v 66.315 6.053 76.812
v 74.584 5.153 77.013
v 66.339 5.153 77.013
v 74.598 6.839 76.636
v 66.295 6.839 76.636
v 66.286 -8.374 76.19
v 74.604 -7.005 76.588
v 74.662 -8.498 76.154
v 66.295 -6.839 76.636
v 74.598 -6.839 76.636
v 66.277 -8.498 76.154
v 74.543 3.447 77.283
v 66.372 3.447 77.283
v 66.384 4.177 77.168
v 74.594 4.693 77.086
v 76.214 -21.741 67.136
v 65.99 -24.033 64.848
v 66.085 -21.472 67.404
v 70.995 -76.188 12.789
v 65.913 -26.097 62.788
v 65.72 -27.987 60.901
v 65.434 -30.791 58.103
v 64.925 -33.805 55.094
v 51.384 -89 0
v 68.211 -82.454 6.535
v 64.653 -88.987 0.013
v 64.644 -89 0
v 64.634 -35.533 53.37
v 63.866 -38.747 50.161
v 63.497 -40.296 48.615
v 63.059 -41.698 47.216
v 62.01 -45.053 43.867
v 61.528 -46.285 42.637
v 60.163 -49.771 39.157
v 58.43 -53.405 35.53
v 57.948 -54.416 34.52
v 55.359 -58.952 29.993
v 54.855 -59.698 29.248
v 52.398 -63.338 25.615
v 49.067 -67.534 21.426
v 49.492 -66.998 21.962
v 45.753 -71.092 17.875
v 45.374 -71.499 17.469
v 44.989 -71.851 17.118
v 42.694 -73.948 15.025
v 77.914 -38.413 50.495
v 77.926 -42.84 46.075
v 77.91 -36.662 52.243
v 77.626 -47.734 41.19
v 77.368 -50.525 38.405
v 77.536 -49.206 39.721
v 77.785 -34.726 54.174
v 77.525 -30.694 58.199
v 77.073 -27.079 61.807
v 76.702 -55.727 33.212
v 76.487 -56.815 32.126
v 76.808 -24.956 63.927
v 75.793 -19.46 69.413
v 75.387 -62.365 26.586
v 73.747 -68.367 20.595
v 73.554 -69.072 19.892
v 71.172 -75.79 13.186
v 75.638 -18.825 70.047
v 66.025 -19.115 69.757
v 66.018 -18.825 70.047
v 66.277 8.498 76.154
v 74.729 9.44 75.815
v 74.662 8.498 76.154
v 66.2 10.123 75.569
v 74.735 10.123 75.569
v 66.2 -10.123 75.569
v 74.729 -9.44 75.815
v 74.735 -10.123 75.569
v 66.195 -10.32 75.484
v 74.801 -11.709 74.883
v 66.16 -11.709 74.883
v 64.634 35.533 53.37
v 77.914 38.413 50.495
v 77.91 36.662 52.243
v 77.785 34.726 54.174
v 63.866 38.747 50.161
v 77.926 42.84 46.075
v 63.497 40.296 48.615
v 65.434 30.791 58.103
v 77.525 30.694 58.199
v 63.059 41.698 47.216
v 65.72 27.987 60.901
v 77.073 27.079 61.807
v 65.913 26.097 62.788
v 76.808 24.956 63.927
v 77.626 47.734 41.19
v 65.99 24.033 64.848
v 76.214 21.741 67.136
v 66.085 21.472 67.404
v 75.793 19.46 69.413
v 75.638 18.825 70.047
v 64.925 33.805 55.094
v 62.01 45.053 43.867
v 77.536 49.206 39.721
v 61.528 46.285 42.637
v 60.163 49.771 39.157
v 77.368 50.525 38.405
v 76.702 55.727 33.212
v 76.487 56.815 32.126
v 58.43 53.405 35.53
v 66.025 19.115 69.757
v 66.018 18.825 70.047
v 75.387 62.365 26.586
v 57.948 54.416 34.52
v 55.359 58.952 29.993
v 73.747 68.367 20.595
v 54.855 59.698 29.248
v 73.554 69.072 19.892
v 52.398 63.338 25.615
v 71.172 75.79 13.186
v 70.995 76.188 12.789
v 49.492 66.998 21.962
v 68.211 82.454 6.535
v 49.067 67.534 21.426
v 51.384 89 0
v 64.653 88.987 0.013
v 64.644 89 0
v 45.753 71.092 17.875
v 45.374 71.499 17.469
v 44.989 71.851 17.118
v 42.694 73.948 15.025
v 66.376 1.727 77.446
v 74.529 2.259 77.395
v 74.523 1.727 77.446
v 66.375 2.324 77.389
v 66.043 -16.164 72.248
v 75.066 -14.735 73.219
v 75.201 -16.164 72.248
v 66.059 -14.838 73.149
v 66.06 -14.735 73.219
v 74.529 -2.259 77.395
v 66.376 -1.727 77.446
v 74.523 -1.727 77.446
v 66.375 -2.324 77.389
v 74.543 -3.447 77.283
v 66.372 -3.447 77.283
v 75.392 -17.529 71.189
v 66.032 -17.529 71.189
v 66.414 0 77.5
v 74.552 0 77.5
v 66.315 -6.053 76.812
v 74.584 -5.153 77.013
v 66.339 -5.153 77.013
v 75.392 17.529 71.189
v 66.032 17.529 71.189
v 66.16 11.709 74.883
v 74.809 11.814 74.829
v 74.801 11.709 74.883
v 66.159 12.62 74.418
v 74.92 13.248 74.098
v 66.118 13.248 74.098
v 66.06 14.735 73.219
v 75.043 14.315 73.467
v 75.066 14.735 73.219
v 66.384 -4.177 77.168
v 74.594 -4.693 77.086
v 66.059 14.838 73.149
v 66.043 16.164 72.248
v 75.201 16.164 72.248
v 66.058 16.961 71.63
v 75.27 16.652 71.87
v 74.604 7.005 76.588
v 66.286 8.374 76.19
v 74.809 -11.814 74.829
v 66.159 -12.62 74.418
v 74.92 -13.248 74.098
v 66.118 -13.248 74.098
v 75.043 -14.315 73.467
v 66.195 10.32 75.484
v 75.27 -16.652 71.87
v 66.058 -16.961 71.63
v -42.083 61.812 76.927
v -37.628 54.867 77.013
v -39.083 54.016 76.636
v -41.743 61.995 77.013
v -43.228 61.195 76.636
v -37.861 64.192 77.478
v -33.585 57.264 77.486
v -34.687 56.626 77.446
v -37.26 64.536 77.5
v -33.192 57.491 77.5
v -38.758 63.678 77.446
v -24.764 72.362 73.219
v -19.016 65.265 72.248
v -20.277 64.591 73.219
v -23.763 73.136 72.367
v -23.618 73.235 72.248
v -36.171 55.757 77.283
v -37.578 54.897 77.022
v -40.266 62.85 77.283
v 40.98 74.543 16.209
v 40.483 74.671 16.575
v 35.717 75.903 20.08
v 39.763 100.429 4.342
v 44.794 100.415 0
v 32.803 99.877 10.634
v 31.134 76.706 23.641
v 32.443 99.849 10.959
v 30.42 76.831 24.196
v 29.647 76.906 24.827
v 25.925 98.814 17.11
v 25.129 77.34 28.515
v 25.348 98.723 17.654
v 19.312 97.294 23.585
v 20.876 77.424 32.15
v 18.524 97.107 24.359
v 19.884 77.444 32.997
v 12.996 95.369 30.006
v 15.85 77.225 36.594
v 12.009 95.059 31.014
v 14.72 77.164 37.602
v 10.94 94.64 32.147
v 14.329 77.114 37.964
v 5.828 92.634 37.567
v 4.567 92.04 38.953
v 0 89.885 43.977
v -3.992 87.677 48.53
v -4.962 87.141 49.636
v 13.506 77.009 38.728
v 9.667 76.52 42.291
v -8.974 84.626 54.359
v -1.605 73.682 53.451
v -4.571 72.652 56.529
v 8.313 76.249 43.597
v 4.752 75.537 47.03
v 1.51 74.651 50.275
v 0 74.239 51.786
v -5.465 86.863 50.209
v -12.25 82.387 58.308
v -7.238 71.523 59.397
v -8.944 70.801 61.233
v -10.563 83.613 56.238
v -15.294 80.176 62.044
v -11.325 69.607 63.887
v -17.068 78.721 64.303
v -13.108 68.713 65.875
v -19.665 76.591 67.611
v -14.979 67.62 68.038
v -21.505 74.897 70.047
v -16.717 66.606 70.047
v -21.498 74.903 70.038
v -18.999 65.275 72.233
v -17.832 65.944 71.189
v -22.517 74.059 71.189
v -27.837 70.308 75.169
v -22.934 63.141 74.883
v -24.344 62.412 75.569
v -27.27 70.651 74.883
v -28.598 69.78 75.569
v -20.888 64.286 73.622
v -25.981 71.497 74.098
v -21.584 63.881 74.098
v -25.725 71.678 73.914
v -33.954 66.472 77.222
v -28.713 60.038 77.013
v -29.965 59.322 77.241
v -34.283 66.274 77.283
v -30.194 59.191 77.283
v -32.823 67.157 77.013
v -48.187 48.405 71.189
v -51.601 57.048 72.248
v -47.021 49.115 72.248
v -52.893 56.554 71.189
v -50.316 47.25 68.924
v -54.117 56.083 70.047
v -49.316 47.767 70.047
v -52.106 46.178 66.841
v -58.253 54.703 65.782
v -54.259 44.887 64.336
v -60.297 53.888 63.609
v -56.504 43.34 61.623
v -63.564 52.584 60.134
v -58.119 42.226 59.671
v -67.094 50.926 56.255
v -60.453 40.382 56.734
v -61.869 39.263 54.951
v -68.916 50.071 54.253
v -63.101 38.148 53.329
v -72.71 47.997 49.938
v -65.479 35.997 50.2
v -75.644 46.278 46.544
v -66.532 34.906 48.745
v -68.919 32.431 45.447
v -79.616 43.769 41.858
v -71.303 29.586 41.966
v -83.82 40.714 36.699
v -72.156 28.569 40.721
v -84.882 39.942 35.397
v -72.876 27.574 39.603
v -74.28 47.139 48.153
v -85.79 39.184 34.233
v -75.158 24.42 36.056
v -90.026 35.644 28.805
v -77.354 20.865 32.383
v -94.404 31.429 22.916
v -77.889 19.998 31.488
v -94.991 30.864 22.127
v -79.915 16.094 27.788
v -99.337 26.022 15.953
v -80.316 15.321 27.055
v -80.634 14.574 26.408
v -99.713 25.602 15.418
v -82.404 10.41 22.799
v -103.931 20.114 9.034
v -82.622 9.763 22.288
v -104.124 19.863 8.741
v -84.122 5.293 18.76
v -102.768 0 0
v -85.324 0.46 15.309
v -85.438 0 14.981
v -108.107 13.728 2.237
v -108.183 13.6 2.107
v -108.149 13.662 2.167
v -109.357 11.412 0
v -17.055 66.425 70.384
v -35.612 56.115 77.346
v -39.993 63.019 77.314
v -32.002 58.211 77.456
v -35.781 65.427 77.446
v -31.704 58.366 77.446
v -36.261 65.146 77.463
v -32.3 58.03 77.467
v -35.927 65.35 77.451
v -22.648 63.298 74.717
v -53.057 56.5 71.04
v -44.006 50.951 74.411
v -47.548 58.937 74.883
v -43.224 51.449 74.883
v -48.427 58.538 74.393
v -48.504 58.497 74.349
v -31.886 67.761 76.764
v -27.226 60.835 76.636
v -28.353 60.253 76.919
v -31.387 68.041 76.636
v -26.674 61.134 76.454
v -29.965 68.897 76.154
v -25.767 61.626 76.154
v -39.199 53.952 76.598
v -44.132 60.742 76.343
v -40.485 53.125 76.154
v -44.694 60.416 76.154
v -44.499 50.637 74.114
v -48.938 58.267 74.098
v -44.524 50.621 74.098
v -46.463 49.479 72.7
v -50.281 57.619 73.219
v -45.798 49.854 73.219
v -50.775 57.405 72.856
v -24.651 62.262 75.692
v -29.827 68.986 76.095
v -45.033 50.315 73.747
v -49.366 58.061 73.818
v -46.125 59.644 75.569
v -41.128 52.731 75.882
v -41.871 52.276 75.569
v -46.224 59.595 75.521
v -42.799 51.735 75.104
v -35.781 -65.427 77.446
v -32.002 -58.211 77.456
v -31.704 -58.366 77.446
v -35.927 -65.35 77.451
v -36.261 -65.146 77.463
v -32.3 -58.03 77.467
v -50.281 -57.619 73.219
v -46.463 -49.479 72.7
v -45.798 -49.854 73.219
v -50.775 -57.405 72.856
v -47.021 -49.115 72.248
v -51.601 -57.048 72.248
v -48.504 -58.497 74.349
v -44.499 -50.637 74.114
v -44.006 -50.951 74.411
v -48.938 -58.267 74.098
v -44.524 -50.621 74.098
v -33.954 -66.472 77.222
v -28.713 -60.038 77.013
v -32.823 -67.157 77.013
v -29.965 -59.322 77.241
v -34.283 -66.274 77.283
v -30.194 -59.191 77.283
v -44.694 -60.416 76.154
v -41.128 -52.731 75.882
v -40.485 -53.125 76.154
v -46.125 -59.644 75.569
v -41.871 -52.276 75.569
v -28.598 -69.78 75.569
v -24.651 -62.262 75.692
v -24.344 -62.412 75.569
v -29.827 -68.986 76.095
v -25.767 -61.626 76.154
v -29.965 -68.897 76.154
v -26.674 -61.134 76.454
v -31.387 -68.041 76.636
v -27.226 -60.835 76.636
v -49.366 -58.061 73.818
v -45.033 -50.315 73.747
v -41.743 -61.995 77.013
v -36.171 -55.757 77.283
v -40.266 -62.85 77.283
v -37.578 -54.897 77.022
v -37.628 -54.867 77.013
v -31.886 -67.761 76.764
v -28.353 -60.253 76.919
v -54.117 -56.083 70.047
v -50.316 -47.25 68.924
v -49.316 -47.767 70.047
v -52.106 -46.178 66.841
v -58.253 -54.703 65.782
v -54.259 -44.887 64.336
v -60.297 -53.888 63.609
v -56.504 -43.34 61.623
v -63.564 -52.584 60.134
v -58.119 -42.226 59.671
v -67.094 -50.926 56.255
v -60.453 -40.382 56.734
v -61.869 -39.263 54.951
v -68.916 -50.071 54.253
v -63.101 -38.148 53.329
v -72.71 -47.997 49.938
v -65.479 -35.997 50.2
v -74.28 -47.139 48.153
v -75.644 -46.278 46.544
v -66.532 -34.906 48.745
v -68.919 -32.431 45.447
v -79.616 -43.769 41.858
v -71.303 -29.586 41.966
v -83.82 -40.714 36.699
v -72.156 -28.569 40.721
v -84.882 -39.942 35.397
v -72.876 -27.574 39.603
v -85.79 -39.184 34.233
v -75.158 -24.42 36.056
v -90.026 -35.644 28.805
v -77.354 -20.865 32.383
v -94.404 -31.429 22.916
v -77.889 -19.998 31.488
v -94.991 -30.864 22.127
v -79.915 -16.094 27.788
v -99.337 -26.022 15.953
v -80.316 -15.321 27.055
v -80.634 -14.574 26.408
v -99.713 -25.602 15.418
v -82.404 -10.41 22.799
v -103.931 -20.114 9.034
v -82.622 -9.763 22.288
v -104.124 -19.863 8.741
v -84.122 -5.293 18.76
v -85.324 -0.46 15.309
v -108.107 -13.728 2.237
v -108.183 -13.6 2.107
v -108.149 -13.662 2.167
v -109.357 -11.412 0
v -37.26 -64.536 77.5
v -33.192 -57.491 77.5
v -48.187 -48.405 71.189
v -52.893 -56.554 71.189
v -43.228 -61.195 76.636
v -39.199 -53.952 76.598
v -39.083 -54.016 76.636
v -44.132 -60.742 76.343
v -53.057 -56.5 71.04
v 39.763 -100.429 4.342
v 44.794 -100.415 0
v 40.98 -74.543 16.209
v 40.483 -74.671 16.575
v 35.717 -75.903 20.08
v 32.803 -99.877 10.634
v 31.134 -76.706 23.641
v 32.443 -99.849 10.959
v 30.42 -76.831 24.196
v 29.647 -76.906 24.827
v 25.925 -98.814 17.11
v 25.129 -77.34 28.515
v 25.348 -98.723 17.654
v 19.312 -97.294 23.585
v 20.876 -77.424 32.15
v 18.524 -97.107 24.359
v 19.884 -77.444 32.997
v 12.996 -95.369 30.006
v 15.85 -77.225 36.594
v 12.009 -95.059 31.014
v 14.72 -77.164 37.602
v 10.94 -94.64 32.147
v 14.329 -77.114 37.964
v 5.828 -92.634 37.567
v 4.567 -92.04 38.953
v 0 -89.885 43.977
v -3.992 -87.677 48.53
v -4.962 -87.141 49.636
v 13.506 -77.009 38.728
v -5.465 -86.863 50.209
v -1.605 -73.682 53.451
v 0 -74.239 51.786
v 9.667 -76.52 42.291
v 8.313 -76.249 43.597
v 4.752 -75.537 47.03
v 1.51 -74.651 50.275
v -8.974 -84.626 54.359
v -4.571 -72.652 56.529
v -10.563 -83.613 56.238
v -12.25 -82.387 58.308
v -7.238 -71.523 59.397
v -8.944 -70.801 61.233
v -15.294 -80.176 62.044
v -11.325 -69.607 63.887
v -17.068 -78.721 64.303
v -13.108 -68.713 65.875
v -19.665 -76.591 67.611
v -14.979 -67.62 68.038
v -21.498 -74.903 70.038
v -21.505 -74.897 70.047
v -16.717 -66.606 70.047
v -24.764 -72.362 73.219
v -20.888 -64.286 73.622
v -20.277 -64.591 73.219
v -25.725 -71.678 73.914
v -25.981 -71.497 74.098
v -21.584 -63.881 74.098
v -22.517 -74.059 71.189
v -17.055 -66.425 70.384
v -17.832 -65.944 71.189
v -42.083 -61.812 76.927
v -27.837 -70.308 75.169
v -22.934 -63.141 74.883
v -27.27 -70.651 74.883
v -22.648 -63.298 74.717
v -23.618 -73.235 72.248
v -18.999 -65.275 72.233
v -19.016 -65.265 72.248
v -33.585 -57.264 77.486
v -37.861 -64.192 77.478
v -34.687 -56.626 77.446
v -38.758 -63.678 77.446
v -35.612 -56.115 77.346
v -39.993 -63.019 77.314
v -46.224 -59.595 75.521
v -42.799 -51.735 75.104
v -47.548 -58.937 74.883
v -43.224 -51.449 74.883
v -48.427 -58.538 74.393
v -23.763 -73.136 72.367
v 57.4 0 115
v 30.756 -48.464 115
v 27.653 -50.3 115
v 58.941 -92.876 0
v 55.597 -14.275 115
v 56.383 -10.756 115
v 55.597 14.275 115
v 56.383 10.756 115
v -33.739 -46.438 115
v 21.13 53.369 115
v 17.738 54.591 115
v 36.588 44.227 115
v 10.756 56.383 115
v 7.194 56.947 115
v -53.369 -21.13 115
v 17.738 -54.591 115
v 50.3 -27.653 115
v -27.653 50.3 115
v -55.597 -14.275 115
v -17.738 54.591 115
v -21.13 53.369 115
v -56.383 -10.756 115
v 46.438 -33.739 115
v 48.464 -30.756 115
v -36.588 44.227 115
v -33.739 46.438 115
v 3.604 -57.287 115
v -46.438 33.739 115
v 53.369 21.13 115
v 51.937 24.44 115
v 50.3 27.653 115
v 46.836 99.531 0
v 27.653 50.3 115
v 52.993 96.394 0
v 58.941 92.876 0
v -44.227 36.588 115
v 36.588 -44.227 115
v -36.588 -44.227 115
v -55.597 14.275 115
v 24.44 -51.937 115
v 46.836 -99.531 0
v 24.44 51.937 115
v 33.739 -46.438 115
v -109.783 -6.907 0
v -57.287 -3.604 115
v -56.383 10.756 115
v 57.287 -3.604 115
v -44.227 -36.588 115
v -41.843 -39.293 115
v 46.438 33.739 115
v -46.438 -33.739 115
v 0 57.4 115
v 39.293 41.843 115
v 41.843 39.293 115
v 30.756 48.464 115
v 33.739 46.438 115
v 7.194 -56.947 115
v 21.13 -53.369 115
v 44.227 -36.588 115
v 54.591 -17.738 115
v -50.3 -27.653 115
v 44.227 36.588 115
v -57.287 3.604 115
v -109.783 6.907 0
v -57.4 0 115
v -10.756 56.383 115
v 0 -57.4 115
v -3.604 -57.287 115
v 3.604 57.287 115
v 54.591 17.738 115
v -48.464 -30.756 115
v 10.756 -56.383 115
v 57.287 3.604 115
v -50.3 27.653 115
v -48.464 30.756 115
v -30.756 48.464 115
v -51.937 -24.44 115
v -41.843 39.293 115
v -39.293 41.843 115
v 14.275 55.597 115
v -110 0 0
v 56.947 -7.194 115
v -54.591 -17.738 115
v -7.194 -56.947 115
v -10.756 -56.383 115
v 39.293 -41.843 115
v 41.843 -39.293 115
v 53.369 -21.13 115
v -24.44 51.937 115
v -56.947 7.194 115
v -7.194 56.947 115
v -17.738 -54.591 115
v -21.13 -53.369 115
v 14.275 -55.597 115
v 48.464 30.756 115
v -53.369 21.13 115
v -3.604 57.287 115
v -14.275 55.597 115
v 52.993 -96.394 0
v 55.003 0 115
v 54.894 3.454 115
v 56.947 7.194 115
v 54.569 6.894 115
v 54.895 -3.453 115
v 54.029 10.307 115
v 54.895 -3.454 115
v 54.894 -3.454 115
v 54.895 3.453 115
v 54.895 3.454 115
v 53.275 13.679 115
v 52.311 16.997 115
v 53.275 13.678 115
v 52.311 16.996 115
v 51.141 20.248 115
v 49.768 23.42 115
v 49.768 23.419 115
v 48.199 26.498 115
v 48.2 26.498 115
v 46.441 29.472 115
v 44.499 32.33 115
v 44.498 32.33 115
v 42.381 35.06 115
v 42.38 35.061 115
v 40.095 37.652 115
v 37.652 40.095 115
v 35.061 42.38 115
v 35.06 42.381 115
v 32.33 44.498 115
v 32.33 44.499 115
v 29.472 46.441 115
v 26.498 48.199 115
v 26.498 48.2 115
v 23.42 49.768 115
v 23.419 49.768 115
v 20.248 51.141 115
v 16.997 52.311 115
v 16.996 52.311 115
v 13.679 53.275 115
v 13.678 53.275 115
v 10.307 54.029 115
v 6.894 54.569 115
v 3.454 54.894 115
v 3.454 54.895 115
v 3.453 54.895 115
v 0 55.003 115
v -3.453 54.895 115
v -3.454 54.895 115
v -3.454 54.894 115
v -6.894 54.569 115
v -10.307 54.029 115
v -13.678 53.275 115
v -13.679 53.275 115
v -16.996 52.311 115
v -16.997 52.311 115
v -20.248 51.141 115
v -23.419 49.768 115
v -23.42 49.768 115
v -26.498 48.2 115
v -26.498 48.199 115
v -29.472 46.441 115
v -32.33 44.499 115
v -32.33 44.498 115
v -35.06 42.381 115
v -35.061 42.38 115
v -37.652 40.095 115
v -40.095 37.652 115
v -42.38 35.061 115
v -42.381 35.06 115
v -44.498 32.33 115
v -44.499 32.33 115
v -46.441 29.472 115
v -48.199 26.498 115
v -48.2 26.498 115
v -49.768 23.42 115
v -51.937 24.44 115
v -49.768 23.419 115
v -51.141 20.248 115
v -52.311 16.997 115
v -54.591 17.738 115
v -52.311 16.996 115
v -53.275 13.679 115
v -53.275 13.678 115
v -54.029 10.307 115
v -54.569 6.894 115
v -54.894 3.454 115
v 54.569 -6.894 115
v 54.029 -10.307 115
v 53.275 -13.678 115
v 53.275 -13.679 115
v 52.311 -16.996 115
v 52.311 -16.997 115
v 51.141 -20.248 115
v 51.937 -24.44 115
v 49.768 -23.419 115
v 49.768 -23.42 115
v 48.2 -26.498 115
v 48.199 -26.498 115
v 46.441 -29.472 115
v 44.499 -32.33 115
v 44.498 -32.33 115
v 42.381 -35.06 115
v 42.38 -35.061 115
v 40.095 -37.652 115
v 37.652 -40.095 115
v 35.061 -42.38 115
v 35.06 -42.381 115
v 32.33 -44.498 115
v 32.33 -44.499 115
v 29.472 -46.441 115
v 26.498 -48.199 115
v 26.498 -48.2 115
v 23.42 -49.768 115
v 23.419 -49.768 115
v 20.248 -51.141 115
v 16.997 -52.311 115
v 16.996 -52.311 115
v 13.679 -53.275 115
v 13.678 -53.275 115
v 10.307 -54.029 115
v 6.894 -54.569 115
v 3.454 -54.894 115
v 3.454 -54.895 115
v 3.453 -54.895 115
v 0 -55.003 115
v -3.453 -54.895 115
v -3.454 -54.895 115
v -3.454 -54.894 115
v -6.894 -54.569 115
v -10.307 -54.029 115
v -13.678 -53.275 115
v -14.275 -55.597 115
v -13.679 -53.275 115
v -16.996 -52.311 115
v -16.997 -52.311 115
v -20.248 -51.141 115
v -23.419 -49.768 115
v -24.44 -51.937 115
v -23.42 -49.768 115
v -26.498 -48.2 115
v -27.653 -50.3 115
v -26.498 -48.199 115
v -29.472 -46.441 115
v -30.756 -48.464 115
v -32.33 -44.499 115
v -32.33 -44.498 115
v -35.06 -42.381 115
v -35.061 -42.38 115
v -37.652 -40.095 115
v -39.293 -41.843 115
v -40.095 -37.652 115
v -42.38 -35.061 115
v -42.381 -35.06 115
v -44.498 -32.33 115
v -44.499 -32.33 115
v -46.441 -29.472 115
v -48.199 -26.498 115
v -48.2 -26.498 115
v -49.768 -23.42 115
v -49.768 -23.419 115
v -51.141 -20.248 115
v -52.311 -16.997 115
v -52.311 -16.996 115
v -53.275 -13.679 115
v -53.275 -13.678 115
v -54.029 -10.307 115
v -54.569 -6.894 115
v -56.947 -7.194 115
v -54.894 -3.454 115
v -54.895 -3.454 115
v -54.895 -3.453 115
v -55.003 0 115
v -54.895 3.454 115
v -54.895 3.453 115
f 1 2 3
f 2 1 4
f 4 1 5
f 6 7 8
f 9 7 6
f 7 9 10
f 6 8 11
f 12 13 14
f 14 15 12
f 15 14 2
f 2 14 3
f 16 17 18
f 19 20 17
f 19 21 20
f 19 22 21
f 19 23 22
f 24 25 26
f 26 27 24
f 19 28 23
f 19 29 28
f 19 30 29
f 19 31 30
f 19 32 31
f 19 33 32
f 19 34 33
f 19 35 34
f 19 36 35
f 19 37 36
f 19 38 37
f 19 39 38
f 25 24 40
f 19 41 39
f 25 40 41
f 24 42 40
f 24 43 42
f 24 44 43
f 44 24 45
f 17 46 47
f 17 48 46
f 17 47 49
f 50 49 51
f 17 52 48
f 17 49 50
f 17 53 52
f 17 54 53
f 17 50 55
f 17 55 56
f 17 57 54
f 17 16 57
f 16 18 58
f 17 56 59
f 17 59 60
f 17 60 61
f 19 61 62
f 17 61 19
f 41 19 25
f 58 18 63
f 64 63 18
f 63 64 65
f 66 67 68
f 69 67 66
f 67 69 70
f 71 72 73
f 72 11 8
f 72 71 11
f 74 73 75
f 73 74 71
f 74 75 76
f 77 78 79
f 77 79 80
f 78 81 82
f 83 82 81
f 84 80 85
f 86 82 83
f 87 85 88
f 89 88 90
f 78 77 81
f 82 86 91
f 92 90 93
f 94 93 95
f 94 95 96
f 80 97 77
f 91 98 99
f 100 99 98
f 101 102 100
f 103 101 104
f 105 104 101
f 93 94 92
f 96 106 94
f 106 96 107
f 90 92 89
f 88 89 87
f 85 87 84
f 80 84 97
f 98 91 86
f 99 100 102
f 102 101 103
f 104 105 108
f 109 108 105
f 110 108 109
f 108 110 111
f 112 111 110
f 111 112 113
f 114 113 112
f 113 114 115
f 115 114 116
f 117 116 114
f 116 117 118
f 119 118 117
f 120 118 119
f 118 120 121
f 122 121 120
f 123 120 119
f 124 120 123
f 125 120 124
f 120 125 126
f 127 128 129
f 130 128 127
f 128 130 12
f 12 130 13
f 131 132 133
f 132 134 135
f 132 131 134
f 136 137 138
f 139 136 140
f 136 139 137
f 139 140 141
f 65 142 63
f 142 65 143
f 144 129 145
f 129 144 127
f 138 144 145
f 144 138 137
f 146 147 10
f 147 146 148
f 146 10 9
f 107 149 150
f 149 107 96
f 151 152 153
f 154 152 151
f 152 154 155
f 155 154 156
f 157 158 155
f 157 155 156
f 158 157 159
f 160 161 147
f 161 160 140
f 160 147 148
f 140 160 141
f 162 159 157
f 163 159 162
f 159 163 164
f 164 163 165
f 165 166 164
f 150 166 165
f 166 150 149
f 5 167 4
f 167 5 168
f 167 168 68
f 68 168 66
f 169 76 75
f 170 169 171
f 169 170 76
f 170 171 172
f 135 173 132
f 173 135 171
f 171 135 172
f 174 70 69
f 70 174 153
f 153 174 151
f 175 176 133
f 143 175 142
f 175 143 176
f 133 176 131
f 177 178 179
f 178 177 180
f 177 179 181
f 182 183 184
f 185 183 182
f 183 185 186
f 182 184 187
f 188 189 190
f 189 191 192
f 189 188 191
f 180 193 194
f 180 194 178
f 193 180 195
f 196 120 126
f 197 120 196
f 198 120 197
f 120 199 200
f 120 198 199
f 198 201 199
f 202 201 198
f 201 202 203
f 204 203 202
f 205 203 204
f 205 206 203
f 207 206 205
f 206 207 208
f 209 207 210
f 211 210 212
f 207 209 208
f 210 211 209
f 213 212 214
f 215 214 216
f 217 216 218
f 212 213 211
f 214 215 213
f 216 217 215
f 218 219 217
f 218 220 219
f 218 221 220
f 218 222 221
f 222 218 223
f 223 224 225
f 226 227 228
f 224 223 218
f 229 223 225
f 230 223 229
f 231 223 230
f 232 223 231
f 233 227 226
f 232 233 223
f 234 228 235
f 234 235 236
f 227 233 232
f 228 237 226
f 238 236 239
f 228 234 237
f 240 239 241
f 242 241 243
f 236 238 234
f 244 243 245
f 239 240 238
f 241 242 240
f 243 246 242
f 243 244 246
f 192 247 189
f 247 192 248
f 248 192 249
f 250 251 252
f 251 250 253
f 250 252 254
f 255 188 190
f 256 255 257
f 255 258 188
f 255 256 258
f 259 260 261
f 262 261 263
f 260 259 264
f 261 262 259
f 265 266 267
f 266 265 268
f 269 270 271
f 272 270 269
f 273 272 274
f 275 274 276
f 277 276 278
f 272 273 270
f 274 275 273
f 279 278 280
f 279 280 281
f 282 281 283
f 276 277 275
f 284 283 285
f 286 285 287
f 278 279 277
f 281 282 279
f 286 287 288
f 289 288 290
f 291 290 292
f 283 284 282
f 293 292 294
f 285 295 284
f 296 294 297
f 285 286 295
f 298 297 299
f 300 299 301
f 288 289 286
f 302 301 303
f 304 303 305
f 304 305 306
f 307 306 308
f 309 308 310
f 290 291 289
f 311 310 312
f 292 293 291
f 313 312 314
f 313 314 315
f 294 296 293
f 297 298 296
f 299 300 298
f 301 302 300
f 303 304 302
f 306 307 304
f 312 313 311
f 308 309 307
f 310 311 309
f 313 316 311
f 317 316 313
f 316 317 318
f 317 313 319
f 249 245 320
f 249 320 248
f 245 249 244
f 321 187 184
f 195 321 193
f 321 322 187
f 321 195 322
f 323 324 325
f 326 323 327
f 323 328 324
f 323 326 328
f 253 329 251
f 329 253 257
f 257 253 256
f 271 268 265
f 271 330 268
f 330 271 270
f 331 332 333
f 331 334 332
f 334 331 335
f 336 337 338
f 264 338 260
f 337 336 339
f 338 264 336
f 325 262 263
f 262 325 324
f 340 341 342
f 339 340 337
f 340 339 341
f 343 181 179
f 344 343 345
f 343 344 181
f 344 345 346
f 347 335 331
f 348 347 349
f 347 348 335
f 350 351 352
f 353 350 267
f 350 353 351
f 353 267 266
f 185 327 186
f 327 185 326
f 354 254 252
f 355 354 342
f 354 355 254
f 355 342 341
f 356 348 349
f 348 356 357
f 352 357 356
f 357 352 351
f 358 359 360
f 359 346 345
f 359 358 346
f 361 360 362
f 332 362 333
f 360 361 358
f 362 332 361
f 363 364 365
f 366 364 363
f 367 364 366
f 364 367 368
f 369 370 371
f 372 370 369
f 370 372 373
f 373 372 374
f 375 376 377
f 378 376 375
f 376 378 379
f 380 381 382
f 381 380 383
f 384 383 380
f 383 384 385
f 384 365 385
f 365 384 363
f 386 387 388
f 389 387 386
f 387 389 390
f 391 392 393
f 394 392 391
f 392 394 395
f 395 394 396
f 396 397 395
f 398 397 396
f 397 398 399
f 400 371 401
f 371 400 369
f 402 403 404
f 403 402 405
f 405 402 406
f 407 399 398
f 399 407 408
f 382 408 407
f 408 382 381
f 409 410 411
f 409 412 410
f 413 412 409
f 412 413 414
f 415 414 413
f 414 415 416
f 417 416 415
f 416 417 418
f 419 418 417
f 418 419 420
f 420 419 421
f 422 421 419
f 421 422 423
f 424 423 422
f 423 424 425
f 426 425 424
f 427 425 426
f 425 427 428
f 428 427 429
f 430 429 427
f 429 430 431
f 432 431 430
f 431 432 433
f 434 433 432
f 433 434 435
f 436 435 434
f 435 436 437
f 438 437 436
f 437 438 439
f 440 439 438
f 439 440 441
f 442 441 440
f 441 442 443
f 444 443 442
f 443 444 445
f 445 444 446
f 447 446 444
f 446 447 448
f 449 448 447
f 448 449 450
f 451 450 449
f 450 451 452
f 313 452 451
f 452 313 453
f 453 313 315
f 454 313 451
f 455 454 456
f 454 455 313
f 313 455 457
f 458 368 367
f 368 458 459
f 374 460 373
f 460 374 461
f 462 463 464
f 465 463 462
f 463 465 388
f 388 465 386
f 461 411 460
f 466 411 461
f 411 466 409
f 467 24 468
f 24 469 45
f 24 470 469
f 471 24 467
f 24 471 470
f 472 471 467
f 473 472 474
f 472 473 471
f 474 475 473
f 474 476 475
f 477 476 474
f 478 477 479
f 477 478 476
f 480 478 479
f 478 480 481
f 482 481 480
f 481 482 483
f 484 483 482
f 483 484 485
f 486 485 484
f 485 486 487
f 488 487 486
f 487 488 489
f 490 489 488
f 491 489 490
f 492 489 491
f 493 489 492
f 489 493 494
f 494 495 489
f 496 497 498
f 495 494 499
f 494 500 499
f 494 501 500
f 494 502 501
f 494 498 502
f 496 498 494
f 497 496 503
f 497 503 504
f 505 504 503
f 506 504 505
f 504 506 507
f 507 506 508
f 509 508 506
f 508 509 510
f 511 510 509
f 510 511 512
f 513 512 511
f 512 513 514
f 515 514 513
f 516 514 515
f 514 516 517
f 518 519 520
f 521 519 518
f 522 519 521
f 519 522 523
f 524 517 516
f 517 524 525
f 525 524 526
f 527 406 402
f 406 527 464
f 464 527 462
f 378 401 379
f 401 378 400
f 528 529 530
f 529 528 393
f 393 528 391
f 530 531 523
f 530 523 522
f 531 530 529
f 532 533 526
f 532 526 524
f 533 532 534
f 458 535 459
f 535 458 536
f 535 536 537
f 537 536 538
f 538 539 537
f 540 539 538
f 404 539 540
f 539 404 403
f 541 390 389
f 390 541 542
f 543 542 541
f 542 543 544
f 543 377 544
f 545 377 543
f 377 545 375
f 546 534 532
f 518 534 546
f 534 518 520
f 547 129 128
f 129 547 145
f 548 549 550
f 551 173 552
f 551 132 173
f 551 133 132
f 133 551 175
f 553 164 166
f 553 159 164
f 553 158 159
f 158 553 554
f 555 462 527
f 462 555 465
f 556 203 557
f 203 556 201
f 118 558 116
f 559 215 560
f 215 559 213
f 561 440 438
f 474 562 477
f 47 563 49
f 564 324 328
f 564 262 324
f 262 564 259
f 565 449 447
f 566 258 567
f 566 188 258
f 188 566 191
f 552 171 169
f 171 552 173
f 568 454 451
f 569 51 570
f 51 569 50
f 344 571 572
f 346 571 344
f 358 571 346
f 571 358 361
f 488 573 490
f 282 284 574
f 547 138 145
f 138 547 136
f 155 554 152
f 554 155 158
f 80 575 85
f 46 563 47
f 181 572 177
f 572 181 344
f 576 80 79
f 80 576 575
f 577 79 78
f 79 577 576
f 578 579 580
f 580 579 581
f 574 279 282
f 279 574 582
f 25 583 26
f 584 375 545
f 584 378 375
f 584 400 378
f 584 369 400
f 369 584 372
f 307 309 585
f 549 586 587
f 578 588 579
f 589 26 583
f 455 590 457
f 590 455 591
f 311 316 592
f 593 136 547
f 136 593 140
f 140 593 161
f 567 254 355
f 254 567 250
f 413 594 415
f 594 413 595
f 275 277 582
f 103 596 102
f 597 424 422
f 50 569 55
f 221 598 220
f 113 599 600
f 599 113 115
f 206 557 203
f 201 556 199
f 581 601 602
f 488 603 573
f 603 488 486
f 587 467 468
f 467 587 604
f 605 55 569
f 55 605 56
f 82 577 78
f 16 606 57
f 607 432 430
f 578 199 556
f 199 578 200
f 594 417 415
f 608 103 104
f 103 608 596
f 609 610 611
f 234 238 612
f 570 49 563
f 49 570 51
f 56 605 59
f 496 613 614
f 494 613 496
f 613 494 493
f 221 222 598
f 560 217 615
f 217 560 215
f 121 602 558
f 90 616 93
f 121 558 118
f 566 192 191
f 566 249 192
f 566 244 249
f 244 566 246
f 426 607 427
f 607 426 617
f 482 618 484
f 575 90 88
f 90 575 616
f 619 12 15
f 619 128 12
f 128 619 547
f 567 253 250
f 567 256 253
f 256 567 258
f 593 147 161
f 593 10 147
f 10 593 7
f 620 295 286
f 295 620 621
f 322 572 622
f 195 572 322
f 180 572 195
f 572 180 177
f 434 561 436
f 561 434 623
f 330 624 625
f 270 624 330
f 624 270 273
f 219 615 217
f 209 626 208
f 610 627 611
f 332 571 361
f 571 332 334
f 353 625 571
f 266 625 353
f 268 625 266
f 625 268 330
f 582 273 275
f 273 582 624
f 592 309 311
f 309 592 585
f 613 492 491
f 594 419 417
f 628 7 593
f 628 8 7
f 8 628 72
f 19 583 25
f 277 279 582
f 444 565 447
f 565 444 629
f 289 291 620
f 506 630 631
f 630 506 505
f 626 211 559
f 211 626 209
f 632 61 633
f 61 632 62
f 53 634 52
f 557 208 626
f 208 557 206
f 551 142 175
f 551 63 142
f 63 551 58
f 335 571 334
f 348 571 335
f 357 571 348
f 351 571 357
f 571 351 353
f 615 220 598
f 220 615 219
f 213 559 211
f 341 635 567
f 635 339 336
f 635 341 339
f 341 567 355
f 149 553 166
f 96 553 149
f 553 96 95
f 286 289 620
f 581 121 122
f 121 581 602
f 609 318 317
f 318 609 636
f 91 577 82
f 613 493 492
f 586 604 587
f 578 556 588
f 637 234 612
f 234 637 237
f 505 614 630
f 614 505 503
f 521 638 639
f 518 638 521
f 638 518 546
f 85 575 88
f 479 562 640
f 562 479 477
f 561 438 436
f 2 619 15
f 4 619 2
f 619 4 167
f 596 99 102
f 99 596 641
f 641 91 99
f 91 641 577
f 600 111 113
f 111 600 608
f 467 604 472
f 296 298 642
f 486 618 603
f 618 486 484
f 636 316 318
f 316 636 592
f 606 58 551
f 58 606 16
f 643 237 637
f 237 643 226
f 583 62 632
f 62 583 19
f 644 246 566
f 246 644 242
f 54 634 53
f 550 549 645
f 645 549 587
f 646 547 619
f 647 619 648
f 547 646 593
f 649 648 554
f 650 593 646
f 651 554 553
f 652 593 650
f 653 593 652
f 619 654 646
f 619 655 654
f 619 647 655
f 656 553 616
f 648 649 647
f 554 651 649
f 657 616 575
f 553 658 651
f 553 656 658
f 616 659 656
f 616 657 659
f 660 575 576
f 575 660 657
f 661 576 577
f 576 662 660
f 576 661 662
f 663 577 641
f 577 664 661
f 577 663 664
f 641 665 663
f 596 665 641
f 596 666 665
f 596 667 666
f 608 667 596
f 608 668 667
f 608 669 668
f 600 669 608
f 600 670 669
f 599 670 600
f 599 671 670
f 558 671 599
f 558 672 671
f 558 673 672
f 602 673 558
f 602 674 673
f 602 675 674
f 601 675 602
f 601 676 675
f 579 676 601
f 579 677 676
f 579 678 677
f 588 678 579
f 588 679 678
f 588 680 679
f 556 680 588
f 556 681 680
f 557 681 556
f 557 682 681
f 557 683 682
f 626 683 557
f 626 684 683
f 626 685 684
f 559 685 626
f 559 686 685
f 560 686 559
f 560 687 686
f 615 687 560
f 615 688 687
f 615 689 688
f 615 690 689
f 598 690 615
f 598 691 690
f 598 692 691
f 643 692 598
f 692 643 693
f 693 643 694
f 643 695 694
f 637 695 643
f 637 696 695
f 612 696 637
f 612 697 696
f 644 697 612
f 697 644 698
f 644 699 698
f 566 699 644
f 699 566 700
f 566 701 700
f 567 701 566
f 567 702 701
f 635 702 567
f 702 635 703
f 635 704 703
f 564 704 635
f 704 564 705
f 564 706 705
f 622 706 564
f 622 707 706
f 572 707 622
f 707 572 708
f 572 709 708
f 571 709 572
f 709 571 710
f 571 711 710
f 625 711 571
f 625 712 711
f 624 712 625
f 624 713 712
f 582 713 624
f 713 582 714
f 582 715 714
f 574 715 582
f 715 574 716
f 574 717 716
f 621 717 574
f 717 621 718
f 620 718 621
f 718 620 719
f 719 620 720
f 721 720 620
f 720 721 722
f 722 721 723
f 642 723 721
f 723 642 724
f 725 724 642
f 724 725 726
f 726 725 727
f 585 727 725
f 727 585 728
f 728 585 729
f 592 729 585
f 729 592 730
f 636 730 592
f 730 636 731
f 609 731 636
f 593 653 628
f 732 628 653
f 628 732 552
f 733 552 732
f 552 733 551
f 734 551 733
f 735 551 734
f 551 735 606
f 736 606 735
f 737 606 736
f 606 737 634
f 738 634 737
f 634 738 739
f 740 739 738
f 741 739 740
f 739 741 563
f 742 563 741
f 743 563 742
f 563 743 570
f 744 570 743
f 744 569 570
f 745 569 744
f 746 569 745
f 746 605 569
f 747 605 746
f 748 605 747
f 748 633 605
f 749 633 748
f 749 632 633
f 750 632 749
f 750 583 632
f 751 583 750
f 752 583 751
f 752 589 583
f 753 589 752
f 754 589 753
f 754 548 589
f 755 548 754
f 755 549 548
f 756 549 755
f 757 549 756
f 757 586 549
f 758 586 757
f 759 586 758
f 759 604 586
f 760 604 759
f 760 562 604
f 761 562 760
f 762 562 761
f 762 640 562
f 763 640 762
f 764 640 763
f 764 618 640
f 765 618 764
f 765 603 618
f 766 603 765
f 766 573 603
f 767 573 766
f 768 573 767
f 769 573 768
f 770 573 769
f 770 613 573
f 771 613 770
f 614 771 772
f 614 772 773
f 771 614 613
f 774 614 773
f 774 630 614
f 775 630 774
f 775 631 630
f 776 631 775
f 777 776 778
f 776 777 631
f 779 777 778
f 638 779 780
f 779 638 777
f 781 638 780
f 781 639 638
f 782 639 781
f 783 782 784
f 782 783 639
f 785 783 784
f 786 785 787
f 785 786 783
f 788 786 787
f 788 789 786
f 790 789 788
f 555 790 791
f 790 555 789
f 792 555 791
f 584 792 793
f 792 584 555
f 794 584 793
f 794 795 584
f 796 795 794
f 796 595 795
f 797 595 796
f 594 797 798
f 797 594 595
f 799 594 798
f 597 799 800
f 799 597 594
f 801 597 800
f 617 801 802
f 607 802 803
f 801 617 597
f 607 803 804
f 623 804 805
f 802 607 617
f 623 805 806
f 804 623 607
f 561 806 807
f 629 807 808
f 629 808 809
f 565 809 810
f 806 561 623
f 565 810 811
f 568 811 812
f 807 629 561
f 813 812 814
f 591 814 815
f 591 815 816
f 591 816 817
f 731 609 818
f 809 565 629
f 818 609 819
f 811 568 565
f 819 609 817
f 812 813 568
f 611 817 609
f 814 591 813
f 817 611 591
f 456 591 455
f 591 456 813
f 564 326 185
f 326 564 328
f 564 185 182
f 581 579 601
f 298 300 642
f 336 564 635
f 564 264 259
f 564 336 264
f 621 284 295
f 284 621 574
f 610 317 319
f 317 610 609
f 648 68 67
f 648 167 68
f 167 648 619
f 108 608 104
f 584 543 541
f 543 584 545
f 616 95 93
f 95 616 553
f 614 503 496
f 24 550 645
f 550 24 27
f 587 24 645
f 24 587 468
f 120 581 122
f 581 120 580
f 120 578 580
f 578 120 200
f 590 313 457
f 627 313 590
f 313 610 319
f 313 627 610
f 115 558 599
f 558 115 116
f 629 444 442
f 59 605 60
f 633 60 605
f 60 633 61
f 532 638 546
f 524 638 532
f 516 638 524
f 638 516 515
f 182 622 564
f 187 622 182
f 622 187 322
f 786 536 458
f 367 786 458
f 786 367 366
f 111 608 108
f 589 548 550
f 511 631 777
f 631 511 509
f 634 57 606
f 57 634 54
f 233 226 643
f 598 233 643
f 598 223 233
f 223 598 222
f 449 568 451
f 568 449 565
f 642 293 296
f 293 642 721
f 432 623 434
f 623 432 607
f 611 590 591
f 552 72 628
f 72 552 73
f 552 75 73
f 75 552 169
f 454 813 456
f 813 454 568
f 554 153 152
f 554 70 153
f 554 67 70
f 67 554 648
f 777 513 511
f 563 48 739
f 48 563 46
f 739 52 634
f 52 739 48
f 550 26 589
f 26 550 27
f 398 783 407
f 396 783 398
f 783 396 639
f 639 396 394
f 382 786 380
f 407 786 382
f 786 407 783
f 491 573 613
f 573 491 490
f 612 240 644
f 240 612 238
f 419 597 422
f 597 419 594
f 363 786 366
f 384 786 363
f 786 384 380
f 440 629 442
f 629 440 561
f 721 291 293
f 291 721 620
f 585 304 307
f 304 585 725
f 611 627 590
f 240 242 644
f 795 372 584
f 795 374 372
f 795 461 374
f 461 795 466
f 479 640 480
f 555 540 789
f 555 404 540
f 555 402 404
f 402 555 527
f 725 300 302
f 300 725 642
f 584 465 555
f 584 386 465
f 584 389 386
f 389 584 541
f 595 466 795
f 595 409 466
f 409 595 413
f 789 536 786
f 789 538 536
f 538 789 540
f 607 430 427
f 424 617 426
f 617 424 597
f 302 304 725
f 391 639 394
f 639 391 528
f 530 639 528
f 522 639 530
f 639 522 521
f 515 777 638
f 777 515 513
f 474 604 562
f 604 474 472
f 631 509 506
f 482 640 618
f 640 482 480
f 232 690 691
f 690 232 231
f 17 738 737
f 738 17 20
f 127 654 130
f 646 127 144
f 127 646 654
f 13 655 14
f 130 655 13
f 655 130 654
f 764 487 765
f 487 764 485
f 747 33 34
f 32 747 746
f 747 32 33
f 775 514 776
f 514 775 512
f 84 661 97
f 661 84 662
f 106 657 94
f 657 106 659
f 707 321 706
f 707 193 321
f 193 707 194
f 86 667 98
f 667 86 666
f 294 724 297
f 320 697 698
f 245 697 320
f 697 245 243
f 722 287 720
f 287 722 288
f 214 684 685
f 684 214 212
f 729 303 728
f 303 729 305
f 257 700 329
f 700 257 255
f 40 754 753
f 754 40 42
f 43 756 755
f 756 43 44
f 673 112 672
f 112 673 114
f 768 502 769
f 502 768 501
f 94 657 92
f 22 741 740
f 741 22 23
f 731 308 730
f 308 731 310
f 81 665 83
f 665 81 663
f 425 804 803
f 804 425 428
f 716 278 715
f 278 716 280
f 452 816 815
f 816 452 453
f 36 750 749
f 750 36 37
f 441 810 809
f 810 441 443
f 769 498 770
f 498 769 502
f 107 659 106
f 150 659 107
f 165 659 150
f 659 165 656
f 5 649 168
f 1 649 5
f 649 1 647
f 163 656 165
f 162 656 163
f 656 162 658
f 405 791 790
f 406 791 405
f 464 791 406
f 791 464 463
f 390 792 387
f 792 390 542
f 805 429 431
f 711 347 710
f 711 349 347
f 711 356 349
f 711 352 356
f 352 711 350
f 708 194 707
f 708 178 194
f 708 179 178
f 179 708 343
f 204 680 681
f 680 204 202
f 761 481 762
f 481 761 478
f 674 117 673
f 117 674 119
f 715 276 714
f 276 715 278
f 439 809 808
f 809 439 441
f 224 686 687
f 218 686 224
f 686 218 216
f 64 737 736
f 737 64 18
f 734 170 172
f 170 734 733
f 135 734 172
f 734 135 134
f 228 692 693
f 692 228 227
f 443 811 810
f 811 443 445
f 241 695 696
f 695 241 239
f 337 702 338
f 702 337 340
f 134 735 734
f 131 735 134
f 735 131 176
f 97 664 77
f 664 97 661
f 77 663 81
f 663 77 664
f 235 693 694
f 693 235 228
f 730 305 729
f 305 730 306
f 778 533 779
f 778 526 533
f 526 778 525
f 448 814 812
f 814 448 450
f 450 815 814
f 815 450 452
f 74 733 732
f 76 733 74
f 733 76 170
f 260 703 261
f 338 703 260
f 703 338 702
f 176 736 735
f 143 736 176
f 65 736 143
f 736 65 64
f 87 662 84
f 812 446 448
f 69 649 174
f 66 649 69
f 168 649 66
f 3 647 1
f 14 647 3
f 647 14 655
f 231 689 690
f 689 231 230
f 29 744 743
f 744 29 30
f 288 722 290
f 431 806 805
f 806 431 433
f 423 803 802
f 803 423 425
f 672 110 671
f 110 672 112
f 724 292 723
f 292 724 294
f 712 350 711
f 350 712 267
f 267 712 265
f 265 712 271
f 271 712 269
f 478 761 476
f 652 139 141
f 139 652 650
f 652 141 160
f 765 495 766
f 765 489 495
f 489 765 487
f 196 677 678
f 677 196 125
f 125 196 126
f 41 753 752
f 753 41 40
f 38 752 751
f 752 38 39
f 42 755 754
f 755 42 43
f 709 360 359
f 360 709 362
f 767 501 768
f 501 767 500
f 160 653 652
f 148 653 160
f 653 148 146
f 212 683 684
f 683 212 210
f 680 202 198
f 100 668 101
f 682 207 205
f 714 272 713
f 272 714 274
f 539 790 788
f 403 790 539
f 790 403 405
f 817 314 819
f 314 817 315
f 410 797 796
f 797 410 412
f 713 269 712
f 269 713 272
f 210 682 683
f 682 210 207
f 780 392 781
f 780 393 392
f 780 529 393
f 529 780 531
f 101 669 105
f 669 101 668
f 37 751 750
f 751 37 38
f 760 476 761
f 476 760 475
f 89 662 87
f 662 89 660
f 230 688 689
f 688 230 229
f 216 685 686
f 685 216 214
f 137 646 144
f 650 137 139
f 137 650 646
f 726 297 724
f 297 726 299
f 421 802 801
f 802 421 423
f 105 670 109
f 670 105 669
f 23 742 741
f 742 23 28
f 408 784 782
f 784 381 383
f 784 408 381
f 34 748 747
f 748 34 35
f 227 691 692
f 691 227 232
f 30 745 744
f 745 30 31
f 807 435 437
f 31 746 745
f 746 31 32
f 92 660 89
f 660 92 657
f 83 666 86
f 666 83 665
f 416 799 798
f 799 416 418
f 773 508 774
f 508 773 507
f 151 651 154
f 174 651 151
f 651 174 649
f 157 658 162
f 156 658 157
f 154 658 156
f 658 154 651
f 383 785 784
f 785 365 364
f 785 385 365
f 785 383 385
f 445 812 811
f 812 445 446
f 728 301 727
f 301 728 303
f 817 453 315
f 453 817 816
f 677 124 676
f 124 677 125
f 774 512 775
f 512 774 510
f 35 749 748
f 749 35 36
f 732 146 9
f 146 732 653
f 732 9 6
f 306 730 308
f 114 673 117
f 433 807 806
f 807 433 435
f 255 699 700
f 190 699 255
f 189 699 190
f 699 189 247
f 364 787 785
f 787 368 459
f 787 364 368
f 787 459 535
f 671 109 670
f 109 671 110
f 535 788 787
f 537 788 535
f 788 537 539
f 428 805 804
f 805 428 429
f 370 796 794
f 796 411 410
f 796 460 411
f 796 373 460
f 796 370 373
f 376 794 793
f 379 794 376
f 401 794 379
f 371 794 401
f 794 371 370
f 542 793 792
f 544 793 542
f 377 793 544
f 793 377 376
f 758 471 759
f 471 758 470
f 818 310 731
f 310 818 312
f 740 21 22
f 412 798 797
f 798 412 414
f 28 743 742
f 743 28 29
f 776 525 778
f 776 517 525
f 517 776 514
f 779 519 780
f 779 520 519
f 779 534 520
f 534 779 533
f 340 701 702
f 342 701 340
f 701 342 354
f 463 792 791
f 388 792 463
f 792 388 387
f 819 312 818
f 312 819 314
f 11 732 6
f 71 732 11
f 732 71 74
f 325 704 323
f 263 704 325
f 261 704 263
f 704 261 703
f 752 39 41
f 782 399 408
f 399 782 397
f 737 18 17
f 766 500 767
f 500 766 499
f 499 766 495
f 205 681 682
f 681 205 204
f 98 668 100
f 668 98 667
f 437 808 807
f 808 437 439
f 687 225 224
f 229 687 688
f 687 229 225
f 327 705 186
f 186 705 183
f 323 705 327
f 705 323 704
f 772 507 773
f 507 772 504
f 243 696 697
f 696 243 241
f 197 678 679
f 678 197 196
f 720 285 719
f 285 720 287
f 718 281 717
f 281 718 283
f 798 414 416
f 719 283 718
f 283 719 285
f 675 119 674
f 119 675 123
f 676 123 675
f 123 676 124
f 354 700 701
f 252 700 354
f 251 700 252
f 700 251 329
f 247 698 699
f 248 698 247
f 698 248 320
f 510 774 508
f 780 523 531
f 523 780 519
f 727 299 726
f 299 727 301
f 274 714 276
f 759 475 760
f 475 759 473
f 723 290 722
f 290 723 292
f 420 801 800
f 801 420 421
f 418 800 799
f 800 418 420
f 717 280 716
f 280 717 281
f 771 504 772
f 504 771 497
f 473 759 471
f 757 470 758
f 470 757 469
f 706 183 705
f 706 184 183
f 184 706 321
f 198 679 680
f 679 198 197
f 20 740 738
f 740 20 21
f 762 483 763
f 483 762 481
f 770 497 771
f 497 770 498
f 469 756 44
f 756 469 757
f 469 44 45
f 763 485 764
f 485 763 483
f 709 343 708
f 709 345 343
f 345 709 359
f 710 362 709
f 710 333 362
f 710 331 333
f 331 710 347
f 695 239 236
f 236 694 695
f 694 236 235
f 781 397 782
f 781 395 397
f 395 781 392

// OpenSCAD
/* Single Wine Bottle Drying Rack
/  
*/
$fn = $preview ? 25:100;

// 1 Gallon Carboy
bottle_neck_od = 110;
bottle_neck_length = 95;
radial_top_wall_thickness = 2.4;
radial_bottom_wall_thickness = 20;
stand_length = 20;

/*
// 1 liter EZ Cap Bottle
bottle_neck_od = 59;
bottle_neck_length = 120;
radial_top_wall_thickness = 3;
radial_bottom_wall_thickness = 12;
stand_length = 5;
*/

/*
// 16 oz Estilo Swing Top Bottle
bottle_neck_od = 55;
bottle_neck_length = 110;
radial_top_wall_thickness = 3;
radial_bottom_wall_thickness = 12;
stand_length = 5;  
*/

/*
// User defined for new bottle types
bottle_neck_od = 59;
bottle_neck_length = 120;
radial_top_wall_thickness = 3;
radial_bottom_wall_thickness = 12;
stand_length = 5;
*/

top_od = bottle_neck_od+2*radial_top_wall_thickness;
bottom_od = 2*bottle_neck_od;

top_id = bottle_neck_od;
bottom_id = bottom_od - 2*radial_bottom_wall_thickness;

total_length = bottle_neck_length + stand_length;

theta = atan(2*total_length/(bottom_od-top_od));

module leg_cut() {
    hull() {
        translate([0,0,total_length-(top_id/2)-10])rotate([0,90,0])cylinder(h=bottom_od/2, d=top_id/2);
        translate([0,-(bottom_id-2)/2,-1])cube([bottom_od/2,bottom_id-2,1]);
    }
}

difference() {
    cylinder(h=total_length, d1=bottom_od, d2=top_od);

    // cut hole for bottle neck
    translate([0,0,-0.01])cylinder(h=total_length+0.02, d1=bottom_id, d2=top_id);

    // remove material for legs
    for (i=[0:360/3:360]) {
        rotate(i)leg_cut();
    }
}
